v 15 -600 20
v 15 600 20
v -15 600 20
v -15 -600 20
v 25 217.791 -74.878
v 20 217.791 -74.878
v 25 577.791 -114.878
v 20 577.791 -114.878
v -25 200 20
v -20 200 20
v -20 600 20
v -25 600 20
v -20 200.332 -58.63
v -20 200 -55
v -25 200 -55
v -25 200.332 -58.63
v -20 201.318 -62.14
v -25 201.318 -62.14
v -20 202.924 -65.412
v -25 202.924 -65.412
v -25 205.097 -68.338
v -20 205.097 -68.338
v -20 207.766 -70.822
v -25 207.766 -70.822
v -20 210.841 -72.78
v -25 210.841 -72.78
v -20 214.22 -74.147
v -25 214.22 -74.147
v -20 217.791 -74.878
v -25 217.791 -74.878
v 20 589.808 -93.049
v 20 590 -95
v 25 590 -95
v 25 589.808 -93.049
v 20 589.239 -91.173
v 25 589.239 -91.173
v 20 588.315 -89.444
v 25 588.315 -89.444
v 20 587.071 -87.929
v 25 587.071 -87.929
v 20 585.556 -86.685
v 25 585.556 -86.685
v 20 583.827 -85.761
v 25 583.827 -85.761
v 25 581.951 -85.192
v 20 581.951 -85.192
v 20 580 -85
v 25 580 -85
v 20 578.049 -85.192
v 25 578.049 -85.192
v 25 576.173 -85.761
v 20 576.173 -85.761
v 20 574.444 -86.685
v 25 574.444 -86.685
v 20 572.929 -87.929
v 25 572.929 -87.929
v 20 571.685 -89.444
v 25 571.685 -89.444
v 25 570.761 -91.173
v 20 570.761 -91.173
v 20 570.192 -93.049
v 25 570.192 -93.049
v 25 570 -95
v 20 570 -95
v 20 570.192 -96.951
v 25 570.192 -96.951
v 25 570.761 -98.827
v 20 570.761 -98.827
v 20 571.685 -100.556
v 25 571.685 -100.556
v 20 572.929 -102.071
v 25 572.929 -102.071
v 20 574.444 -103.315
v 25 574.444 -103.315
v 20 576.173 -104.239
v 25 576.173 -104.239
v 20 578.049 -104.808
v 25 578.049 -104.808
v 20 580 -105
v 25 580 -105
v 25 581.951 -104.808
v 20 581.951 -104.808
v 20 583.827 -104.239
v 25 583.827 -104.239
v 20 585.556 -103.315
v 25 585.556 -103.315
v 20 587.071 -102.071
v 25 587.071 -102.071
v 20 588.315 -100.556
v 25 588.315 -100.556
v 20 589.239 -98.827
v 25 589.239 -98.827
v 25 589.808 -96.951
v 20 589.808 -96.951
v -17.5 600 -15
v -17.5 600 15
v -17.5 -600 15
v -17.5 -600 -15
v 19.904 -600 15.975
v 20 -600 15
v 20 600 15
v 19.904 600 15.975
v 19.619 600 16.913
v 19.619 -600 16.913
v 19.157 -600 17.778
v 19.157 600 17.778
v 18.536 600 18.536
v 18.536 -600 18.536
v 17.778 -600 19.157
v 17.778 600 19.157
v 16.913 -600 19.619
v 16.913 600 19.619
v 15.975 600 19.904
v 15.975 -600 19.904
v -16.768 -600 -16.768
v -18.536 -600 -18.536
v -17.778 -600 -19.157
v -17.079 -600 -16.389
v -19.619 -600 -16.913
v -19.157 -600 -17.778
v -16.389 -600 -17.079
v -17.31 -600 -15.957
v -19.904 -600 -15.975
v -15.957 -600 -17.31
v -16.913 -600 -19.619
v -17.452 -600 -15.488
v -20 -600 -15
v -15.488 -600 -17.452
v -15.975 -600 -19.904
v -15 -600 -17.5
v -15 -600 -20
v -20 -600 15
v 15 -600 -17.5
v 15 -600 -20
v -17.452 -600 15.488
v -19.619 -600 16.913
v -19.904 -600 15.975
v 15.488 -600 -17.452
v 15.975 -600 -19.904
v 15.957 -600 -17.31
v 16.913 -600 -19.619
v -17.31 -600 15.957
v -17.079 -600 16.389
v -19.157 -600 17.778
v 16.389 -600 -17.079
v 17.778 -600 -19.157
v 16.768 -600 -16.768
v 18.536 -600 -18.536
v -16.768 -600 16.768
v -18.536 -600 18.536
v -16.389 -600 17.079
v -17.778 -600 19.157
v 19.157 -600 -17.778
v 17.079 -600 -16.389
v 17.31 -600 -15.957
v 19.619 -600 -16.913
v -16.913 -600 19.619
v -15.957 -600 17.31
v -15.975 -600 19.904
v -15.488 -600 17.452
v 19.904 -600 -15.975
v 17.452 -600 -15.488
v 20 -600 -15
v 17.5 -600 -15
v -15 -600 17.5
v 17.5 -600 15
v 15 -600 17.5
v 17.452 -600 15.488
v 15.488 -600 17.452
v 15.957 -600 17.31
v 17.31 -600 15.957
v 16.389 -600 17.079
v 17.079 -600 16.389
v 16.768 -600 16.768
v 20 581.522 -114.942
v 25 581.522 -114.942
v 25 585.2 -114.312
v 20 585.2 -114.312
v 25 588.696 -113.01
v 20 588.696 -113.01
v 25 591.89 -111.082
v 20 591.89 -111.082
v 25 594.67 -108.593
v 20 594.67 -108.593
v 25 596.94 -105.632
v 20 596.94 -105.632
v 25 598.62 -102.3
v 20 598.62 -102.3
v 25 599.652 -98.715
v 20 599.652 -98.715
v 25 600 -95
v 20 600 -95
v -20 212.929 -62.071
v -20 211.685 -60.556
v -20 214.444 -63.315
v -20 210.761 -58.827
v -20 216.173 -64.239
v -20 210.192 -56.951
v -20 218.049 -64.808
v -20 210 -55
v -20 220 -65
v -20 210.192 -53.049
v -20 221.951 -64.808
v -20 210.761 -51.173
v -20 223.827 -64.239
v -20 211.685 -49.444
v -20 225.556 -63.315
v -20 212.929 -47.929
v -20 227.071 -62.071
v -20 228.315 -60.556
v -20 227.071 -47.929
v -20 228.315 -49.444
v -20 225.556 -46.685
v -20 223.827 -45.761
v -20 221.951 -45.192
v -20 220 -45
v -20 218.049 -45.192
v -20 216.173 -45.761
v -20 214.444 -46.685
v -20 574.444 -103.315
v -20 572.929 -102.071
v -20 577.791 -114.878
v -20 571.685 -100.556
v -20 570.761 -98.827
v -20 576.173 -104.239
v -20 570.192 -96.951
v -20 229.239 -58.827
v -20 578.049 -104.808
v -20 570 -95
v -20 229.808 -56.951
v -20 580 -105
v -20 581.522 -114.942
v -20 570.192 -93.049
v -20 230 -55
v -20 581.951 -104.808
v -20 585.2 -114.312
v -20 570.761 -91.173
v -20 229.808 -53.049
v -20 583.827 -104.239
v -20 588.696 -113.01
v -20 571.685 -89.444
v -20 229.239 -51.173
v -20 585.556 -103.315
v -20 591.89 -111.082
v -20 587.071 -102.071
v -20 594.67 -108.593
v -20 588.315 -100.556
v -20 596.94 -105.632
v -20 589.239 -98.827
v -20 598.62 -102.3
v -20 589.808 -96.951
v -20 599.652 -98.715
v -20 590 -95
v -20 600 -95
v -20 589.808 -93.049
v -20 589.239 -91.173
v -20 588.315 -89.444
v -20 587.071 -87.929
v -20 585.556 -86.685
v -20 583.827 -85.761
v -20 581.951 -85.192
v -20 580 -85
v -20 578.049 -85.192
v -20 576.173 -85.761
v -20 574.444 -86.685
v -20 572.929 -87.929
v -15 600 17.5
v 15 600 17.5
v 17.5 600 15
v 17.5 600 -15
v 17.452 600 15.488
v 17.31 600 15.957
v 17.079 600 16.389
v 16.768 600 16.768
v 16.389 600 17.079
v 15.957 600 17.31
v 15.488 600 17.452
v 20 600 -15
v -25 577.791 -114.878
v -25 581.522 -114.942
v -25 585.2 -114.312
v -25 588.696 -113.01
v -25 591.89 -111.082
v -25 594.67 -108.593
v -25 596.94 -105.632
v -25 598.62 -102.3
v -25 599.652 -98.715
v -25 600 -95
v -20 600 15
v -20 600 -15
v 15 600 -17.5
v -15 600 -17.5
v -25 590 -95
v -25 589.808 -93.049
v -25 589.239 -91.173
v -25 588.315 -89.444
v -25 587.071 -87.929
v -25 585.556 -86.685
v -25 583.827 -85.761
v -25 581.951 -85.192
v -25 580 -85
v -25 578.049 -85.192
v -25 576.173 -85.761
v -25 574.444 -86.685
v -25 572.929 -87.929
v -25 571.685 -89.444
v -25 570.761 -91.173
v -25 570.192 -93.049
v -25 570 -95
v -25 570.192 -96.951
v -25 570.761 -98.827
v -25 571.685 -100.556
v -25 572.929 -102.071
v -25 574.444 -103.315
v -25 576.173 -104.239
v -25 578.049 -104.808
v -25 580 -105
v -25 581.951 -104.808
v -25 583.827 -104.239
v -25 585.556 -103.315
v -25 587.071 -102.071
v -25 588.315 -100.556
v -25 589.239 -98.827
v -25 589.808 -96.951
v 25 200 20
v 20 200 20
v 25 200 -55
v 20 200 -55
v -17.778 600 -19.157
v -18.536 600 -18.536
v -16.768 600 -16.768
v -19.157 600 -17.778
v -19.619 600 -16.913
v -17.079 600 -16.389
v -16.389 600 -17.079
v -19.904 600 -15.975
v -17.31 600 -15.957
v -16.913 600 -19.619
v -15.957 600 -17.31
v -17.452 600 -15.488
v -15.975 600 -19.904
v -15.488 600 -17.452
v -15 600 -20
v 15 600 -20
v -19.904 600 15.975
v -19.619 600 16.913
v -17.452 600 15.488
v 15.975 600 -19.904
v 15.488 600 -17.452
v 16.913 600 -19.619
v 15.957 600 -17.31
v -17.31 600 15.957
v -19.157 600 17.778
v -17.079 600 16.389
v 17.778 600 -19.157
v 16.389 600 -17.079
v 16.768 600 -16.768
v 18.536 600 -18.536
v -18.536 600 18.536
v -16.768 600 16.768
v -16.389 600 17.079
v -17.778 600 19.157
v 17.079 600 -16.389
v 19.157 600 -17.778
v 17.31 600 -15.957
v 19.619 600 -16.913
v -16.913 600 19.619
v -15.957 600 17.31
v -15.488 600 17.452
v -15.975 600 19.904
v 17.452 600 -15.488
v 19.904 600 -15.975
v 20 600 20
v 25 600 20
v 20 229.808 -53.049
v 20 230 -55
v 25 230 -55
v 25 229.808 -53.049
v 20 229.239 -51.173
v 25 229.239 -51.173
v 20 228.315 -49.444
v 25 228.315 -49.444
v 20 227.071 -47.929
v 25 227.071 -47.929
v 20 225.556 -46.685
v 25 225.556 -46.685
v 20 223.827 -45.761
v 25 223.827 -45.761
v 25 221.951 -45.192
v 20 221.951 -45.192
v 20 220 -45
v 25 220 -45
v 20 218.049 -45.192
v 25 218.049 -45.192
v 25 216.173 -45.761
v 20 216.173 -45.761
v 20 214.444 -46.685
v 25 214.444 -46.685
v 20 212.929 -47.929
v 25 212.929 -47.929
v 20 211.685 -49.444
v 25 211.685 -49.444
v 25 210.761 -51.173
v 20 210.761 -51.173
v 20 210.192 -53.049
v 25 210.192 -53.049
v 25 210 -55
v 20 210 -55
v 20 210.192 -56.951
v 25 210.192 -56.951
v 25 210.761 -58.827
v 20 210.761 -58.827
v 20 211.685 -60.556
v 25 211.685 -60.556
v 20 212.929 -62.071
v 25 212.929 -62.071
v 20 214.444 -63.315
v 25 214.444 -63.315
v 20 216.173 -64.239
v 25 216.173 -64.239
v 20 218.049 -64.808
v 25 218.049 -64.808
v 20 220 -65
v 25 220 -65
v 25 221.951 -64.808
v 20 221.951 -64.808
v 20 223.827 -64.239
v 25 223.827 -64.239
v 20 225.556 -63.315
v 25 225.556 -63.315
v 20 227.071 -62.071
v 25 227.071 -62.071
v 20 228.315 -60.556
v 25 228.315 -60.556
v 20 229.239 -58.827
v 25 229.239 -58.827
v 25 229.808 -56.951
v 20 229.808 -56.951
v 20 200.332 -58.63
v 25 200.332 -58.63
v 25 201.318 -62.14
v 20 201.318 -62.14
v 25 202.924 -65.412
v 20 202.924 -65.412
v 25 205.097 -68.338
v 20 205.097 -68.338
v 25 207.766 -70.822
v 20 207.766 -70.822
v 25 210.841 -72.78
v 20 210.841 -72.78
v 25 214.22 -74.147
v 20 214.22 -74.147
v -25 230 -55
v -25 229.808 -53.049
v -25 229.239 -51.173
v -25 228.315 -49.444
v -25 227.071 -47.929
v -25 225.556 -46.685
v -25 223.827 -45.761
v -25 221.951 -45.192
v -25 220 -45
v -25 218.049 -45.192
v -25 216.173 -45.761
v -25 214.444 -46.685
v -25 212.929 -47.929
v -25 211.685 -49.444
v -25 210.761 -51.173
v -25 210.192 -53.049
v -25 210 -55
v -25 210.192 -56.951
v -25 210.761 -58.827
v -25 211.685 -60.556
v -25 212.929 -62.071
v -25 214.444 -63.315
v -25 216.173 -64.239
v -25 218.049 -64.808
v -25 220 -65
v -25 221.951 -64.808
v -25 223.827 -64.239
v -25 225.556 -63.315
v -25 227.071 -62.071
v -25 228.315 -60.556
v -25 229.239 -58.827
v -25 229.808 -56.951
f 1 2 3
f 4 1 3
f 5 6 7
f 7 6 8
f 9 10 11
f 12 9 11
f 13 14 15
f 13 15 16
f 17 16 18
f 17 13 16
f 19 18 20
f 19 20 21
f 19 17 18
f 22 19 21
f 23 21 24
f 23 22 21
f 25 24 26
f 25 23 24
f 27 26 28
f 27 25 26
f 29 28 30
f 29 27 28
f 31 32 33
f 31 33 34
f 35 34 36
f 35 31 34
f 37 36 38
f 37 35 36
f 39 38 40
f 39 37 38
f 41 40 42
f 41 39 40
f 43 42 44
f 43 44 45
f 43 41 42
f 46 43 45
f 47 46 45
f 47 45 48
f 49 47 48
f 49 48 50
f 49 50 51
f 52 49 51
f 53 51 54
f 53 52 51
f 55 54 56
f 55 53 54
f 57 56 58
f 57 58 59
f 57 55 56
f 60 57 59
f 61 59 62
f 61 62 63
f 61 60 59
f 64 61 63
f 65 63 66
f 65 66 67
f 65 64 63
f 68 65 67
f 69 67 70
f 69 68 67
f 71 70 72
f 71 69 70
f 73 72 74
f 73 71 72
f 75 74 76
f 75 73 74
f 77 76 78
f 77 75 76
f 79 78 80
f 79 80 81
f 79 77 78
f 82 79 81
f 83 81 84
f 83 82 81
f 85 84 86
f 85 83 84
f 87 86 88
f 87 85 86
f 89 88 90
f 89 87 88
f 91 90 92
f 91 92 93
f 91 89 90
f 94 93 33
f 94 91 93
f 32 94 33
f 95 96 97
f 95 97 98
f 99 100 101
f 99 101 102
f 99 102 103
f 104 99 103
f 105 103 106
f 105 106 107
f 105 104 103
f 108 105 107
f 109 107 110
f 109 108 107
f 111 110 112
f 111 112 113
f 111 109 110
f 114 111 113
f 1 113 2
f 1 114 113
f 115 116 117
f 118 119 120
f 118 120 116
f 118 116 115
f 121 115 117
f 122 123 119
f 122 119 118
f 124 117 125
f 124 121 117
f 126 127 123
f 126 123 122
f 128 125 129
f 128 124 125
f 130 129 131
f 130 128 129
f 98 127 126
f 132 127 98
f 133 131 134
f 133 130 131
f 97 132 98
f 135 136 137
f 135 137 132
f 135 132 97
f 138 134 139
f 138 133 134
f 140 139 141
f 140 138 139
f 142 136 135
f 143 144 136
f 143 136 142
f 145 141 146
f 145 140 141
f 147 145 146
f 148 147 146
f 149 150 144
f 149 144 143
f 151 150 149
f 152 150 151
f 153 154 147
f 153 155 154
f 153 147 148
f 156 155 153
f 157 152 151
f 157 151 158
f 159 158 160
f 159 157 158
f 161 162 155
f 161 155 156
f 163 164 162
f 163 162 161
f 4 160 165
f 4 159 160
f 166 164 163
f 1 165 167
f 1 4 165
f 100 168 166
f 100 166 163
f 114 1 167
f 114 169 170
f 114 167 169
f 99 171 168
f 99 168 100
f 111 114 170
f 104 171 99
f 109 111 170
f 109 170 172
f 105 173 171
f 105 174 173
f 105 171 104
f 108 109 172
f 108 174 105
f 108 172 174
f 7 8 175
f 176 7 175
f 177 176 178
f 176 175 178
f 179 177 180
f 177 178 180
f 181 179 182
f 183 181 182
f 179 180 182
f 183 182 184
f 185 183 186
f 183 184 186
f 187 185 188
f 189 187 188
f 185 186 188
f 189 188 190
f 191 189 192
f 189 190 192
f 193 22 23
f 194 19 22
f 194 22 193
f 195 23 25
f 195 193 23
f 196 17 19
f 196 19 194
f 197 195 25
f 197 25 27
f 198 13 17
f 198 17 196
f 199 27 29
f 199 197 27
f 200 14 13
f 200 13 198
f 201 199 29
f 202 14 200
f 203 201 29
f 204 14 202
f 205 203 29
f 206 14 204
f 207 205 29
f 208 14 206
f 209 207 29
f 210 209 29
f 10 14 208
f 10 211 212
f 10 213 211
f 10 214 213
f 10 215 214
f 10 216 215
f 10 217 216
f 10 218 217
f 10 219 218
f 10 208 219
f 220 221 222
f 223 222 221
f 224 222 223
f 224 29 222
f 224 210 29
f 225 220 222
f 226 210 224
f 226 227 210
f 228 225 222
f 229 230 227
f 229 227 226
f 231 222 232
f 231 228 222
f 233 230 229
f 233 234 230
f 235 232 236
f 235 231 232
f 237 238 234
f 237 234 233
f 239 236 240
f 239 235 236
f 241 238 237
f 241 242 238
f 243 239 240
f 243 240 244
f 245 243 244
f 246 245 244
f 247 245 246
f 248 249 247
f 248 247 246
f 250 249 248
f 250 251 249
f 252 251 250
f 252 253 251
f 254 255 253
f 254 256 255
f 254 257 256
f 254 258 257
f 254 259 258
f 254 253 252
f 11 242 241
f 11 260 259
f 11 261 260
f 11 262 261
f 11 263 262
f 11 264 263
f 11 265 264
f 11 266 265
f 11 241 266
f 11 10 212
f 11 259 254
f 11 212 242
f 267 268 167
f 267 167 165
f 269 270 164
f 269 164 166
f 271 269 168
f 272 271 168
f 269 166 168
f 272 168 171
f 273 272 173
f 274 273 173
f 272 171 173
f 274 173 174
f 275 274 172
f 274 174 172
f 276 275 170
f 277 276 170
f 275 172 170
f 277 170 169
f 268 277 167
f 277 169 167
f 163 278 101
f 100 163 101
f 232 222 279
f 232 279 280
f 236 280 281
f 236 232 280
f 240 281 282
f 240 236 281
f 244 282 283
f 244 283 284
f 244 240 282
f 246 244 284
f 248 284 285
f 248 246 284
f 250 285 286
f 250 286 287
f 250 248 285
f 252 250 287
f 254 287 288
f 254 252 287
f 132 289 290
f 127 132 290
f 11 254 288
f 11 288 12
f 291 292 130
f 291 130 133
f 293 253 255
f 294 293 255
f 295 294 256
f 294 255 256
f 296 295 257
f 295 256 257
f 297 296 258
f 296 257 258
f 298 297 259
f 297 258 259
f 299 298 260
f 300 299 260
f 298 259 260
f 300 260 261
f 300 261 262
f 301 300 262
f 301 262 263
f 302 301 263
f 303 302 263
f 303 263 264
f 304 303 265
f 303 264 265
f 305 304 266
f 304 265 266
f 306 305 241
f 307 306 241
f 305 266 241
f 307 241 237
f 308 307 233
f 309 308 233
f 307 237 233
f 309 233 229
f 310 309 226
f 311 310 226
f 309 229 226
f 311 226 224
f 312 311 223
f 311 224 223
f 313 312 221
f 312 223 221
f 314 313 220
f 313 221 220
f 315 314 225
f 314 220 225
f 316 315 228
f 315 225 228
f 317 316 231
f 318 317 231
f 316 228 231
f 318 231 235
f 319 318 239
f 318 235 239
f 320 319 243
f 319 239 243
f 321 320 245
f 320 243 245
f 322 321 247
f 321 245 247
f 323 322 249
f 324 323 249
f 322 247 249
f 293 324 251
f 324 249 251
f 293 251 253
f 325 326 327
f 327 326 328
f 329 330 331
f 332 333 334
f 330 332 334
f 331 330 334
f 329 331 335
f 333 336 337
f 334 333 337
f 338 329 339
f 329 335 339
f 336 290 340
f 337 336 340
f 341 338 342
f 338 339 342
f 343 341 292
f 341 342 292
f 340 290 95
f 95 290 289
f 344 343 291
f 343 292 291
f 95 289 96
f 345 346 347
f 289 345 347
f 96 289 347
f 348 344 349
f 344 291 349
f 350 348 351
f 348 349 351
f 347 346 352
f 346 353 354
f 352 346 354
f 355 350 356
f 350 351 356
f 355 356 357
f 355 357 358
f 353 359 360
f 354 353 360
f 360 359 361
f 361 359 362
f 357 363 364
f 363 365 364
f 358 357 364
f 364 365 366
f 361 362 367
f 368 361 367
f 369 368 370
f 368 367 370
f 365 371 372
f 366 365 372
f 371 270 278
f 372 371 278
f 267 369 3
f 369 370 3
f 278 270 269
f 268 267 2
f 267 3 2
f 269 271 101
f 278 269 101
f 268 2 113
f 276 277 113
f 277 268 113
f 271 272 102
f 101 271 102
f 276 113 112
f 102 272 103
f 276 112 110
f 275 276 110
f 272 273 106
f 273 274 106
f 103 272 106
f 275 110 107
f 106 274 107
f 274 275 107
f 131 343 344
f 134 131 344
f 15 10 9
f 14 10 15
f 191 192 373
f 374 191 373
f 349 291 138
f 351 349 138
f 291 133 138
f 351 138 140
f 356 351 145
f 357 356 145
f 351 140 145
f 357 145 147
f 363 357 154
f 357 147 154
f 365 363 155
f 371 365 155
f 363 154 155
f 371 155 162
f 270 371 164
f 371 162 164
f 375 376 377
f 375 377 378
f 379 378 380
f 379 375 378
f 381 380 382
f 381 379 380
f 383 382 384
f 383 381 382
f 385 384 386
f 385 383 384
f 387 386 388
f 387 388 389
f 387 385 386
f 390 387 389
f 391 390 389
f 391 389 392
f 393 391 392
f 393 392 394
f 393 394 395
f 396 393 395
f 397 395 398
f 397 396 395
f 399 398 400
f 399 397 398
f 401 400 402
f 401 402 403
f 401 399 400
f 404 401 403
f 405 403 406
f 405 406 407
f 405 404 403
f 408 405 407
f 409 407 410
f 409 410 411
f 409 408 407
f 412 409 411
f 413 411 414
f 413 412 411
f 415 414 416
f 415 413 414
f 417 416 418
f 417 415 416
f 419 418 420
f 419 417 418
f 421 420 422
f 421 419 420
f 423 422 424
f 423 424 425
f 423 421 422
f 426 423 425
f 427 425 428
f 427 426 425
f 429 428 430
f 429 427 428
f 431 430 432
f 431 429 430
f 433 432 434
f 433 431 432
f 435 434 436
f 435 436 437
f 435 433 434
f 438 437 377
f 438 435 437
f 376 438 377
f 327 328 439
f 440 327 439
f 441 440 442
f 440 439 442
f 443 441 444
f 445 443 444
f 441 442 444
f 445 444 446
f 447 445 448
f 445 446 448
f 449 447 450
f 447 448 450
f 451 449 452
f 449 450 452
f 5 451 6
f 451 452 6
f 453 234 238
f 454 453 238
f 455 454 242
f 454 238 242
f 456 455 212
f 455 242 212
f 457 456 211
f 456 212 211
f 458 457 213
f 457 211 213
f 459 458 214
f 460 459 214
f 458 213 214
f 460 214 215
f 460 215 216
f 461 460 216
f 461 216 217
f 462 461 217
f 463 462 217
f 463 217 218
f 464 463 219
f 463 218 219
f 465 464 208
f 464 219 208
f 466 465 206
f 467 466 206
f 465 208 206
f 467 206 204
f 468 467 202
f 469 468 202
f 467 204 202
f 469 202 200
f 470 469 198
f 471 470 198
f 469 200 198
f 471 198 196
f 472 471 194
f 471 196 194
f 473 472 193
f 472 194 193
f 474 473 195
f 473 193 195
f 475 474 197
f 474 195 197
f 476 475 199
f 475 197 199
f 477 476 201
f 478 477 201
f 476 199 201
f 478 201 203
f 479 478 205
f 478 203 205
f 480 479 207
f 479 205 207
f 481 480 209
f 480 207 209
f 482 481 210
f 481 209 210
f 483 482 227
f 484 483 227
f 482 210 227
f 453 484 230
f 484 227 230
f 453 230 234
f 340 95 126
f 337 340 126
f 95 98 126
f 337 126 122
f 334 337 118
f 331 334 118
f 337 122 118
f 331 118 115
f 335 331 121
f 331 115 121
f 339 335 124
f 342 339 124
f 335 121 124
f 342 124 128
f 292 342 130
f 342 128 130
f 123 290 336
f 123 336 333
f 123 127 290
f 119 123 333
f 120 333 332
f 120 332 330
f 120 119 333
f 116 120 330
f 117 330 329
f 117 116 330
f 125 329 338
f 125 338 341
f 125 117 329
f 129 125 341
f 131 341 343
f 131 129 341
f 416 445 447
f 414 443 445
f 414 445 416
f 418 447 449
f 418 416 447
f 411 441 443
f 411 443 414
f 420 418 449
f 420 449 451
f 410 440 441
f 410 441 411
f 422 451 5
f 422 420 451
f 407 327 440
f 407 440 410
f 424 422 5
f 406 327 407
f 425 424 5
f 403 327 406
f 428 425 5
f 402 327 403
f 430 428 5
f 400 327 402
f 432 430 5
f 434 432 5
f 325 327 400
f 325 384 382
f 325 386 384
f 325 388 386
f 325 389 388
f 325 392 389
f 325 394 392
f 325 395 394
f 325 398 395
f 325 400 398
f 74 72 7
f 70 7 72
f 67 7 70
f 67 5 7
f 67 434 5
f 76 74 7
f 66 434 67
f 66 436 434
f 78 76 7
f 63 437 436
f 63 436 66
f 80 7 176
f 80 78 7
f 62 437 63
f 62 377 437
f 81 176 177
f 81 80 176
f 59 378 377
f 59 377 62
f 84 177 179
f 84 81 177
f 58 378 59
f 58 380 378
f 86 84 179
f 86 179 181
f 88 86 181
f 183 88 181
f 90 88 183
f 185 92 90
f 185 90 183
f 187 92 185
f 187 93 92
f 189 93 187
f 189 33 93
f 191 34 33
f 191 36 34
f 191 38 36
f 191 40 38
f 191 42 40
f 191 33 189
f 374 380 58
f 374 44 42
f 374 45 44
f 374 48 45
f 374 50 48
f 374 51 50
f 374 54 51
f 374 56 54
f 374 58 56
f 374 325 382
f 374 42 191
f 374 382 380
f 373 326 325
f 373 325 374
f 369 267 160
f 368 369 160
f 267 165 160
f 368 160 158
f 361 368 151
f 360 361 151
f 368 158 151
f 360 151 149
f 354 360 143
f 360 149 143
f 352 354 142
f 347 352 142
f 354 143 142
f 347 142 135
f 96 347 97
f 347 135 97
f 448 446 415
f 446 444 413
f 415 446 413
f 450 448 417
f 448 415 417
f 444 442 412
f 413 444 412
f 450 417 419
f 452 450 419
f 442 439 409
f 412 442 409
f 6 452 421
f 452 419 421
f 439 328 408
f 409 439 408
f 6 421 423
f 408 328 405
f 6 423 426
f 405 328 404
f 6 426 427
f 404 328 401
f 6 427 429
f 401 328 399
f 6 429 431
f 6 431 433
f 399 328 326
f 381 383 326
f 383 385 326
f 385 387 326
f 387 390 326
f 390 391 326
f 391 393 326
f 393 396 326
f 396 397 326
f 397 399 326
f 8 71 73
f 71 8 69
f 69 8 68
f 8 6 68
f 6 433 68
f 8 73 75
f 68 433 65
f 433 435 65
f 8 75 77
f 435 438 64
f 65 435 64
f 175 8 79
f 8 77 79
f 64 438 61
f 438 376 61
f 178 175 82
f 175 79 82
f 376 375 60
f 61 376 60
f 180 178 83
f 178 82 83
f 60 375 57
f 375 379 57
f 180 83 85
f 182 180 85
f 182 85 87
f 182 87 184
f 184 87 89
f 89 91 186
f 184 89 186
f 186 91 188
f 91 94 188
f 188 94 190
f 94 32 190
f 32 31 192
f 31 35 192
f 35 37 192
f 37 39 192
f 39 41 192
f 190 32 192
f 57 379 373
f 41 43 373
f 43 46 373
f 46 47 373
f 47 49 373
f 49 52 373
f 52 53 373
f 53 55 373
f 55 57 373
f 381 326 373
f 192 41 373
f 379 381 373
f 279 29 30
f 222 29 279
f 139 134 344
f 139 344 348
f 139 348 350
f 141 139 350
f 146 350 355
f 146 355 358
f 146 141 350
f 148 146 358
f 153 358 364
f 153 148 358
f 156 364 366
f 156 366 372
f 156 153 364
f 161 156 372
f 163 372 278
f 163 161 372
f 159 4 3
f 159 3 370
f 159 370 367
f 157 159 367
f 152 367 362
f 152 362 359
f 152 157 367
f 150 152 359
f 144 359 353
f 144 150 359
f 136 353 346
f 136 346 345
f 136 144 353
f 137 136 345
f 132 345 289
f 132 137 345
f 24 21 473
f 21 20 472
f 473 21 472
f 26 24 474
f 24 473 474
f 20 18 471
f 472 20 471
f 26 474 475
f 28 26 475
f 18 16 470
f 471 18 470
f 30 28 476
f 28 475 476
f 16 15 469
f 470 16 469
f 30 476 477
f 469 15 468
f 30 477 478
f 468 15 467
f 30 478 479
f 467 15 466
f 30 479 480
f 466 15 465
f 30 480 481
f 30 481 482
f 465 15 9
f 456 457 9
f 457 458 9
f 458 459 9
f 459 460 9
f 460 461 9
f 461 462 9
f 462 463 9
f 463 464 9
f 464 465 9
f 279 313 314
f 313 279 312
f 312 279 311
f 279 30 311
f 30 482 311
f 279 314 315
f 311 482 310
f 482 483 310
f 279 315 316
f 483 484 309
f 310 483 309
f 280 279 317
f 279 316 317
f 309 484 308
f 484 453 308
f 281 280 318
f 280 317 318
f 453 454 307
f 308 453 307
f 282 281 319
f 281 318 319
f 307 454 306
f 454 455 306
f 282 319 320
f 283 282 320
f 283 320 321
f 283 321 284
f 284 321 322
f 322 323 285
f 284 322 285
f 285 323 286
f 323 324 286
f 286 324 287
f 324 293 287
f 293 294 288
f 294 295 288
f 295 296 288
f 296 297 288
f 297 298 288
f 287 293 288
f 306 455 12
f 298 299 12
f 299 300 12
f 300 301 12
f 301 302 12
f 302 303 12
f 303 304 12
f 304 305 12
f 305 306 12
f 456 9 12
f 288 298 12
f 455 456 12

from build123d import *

# Parameters (mm, degrees)
F1_DEPTH = 600
F2_T     = -2.5
F3_R     = 10
F3_W     = 400
F3_H     = 30
F3_H_2   = 5
F4_DEPTH = 5


with BuildPart() as f1:
    # F0 (on Front) → F1 (new body, symmetric)
    with BuildSketch(Plane.XZ):
        with BuildLine():
            Line((-15, -20), (15, -20))
            ThreePointArc((15, -20), (18.535534, -18.535534), (20, -15))
            Line((20, -15), (20, 15))
            ThreePointArc((20, 15), (18.535534, 18.535534), (15, 20))
            Line((15, 20), (-15, 20))
            ThreePointArc((-15, 20), (-18.535534, 18.535534), (-20, 15))
            Line((-20, 15), (-20, -15))
            ThreePointArc((-20, -15), (-18.535534, -18.535534), (-15, -20))
        make_face()
    extrude(amount=F1_DEPTH, both=True)

    # F2
    f2_openings = [f1.faces().sort_by_distance(p)[0] for p in [
        (0, -600, 0),
        (0, 600, 0),
    ]]
    offset(amount=F2_T, openings=f2_openings)


with BuildPart() as f4:
    # F3 (on face) → F4 (new body)
    with BuildSketch(Plane.YZ.offset(20)):
        with BuildLine():
            Line((600, -95), (600, -15))
            Line((600, -15), (200, -15))
            Line((200, -15), (200, -55))
            ThreePointArc((200, -55), (205.09744, -68.338429), (217.791369, -74.877675))
            Line((217.791369, -74.877675), (577.791369, -114.877675))
            ThreePointArc((577.791369, -114.877675), (593.338429, -109.90256), (600, -95))
        make_face()
        with Locations((580, -95)):
            Circle(F3_R, mode=Mode.SUBTRACT)
        with Locations((220, -55)):
            Circle(F3_R, mode=Mode.SUBTRACT)
        with Locations((400, 0)):
            Rectangle(F3_W, F3_H)
        with Locations((400, 17.5)):
            Rectangle(F3_W, F3_H_2)
    extrude(amount=F4_DEPTH)


with BuildPart() as f5_1:
    # F5: instance of F4
    add(f4.part.mirror(Plane.YZ))


solid = Compound([f1.part, f4.part, f5_1.part])
